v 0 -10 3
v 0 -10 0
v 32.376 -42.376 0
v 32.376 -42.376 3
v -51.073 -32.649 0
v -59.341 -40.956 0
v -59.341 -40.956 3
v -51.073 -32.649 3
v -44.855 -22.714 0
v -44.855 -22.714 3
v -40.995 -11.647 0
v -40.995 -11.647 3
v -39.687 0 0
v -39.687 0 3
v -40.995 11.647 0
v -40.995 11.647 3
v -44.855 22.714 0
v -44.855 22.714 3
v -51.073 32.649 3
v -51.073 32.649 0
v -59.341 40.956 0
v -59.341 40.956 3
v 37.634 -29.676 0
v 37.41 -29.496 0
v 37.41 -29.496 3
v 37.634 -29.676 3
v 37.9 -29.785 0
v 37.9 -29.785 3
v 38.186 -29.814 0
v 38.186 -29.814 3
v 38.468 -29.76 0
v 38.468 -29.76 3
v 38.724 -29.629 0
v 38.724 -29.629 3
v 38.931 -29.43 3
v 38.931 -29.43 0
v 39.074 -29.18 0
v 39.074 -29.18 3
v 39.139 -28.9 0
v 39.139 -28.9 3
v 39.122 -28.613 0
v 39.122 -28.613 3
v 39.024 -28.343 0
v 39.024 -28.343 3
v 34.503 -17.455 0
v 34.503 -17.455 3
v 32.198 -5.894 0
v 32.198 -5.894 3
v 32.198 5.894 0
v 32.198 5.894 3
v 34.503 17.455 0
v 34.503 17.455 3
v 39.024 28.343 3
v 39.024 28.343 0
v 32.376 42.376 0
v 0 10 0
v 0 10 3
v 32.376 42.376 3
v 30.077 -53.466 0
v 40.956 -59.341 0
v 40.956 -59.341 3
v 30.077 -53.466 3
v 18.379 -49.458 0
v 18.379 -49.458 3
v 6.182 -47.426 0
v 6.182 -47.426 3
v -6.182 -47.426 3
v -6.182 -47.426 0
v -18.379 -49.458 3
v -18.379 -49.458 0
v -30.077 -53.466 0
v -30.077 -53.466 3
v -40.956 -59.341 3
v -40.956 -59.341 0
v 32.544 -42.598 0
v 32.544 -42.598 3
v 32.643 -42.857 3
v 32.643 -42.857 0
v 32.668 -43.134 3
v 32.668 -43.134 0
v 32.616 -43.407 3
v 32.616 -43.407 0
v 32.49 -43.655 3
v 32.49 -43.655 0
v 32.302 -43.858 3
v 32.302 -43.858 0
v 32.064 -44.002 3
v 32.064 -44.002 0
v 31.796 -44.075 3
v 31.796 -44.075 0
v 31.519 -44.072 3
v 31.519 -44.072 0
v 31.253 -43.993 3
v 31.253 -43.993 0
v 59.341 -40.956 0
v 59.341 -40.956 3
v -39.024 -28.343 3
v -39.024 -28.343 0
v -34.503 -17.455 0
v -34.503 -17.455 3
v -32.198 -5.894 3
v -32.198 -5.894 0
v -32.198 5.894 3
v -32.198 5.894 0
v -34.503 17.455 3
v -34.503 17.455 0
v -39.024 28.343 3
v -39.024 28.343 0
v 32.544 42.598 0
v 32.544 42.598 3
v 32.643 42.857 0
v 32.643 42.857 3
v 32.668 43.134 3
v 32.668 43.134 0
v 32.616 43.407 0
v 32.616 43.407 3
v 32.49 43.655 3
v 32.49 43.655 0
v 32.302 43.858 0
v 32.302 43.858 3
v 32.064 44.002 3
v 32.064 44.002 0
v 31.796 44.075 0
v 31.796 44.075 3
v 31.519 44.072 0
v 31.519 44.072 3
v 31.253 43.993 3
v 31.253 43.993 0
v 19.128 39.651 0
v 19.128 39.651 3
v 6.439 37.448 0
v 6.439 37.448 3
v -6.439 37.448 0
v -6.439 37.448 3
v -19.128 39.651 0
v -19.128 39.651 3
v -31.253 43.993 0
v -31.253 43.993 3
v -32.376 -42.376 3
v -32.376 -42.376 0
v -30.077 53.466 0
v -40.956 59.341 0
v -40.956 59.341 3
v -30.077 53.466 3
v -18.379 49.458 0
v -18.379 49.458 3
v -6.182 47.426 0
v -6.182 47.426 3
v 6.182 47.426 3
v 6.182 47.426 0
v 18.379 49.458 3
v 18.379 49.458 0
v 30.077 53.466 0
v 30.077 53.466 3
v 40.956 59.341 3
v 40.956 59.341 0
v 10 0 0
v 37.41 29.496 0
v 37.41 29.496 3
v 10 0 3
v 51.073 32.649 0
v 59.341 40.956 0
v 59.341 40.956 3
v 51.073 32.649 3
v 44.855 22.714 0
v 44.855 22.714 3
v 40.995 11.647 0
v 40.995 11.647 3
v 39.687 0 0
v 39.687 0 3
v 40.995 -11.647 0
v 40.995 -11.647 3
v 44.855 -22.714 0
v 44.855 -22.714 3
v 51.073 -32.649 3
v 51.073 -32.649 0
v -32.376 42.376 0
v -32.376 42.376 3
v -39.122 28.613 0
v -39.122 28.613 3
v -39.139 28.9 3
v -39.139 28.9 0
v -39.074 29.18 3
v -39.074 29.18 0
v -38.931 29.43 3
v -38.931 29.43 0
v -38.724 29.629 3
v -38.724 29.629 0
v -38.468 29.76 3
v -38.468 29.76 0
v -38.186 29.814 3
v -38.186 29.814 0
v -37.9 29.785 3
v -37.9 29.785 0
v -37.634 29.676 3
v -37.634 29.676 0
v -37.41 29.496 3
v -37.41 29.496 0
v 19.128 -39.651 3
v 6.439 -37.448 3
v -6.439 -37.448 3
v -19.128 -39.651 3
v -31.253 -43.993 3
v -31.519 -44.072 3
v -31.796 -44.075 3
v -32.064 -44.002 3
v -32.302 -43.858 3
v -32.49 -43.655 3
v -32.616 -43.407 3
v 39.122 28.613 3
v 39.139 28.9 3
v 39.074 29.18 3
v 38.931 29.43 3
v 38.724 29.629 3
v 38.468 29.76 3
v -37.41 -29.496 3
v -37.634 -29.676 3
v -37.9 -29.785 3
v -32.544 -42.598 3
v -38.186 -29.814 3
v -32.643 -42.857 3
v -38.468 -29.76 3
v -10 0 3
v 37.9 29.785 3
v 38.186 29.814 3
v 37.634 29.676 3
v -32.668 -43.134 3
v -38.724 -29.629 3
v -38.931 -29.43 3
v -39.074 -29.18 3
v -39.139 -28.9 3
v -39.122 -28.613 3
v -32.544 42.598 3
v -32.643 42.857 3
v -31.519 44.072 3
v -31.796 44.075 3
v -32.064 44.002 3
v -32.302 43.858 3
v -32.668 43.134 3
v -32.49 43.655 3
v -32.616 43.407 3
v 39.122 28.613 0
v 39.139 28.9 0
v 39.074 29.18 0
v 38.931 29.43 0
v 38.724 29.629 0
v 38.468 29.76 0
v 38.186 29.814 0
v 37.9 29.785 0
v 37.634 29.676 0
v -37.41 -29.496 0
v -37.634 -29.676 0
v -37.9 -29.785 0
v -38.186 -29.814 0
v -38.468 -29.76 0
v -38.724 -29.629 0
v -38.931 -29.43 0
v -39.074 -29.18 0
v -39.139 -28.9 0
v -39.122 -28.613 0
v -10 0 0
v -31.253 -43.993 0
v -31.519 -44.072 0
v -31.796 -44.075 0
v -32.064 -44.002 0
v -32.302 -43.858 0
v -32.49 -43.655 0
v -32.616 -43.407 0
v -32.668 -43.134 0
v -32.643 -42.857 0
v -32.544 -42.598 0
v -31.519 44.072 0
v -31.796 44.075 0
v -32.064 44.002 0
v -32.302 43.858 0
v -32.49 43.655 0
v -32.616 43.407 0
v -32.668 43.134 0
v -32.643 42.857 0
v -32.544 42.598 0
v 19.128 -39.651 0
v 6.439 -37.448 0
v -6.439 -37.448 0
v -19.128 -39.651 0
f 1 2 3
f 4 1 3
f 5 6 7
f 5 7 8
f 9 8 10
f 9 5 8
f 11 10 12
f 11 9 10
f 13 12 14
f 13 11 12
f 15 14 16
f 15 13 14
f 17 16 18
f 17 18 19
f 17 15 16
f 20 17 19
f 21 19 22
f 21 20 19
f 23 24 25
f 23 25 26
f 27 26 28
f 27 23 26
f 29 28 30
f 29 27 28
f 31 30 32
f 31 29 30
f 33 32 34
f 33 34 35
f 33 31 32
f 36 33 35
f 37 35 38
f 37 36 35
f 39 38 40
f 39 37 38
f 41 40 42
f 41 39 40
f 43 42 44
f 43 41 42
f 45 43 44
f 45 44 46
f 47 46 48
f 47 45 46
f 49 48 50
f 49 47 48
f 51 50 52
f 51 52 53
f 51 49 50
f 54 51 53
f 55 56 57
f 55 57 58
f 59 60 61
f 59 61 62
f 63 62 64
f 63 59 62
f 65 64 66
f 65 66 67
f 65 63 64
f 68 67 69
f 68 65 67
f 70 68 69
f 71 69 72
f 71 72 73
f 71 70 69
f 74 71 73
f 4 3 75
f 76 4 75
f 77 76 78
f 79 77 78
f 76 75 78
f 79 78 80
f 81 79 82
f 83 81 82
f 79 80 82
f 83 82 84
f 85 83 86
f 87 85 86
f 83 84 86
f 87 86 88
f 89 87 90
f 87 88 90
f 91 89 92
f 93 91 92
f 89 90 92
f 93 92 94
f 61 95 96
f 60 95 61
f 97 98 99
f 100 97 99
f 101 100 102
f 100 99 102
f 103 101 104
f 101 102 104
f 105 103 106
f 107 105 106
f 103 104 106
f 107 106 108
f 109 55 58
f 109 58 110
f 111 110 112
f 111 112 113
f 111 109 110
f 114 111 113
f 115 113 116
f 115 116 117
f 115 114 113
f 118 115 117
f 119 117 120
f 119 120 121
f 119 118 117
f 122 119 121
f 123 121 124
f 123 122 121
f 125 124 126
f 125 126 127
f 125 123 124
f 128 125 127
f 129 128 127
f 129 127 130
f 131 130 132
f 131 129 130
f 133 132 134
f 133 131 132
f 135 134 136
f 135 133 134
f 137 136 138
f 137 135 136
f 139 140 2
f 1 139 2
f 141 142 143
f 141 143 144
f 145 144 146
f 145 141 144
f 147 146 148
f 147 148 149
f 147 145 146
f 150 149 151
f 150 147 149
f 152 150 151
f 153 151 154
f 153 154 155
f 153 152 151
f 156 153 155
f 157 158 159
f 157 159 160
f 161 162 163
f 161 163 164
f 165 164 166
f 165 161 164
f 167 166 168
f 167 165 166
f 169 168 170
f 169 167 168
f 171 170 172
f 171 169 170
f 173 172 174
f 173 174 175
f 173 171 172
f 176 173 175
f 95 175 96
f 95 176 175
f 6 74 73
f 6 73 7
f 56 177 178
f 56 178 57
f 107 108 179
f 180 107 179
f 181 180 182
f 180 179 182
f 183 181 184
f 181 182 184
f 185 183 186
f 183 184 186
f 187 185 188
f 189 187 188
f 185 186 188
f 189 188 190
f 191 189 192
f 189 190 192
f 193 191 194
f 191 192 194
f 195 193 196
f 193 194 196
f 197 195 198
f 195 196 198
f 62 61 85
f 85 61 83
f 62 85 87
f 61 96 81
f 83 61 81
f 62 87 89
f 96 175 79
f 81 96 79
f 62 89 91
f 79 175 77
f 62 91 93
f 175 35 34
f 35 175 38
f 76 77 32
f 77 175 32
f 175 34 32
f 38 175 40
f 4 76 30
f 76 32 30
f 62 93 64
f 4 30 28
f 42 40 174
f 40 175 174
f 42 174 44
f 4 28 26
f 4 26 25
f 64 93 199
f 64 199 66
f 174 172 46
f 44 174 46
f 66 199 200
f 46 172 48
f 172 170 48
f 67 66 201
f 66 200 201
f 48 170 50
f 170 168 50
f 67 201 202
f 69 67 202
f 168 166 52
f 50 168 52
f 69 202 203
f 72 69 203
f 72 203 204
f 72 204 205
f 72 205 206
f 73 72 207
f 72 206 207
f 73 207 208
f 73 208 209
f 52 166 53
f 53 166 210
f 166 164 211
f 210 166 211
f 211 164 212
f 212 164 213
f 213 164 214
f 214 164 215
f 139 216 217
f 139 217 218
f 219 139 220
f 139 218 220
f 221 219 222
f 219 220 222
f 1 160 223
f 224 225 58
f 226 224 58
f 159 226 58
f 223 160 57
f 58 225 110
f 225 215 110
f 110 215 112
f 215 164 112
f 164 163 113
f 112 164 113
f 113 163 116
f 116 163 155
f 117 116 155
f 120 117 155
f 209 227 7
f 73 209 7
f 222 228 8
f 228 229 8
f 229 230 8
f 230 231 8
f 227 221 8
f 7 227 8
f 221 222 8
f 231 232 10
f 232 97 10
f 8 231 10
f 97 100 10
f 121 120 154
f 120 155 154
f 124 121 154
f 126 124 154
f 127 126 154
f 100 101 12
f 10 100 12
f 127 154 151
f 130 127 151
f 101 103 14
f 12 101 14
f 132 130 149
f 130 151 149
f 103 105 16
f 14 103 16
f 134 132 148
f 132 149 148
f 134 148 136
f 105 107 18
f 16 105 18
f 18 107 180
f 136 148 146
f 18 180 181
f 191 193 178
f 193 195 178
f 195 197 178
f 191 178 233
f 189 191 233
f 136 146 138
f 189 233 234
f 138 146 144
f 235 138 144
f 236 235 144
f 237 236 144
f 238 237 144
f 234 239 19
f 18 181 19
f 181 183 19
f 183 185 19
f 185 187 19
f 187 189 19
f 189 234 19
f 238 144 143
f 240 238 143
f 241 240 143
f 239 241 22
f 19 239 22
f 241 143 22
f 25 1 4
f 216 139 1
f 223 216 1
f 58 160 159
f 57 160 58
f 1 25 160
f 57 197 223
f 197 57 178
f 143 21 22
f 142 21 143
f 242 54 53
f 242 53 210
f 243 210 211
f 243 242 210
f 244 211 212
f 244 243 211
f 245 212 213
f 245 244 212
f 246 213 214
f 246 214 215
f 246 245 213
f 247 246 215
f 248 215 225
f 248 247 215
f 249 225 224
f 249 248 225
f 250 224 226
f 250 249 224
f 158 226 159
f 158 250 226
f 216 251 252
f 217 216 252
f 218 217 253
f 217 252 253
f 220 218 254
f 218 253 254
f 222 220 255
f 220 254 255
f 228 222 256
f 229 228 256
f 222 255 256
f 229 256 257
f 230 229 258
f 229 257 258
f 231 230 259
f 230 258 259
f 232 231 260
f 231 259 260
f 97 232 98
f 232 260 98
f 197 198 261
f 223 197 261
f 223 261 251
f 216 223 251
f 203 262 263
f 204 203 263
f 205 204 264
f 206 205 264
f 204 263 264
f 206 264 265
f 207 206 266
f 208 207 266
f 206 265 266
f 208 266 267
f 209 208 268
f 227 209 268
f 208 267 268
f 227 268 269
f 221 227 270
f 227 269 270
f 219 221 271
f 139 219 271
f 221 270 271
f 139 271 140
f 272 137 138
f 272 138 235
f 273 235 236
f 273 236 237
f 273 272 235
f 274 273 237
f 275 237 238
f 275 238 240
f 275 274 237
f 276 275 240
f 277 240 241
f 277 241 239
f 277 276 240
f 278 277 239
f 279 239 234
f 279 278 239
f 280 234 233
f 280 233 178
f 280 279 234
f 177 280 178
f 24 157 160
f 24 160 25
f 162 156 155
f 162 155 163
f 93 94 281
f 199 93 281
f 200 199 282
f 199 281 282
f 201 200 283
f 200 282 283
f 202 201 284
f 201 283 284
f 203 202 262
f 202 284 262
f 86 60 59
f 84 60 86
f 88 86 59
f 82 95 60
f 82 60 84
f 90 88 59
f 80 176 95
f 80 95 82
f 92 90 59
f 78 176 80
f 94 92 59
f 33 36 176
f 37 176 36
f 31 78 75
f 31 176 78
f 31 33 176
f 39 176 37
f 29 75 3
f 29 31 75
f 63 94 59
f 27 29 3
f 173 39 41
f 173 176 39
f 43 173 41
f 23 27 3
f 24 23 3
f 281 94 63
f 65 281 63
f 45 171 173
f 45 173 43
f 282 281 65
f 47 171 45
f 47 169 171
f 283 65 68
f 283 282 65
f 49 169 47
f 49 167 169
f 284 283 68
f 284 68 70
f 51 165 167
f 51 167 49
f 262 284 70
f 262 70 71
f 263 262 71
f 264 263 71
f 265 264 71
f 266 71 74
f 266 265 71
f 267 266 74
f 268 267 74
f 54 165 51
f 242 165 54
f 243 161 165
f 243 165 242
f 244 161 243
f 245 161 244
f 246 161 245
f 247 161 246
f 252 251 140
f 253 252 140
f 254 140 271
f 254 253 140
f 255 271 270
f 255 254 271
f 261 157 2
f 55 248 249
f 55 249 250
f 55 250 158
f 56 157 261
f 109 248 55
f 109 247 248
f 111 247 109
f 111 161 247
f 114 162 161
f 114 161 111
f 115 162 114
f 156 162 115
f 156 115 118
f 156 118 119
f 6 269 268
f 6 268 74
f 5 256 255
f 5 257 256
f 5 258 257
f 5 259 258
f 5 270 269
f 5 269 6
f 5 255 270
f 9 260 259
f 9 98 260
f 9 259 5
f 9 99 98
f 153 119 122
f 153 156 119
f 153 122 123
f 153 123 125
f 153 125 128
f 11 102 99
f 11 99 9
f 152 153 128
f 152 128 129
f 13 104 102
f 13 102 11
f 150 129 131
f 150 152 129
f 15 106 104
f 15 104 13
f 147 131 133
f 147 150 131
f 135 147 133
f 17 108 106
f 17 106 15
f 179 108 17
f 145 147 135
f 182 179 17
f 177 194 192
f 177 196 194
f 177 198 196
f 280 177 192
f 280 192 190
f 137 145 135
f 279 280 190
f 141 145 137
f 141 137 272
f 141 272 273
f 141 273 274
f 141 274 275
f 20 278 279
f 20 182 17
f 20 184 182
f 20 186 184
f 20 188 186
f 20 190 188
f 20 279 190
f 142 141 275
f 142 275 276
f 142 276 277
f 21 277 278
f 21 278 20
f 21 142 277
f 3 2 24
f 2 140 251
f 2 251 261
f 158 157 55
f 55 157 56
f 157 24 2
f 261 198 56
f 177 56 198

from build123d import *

# Parameters (mm, degrees)
SKETCH1_R             = 5
BOSS_EXTRUDE1_DEPTH   = 0.1
BOSS_EXTRUDE1_2_DEPTH = 0.1
BOSS_EXTRUDE1_3_DEPTH = 0.1
BOSS_EXTRUDE1_4_DEPTH = 0.1
BOSS_EXTRUDE2_DEPTH   = 3


with BuildPart() as part:
    # Sketch1 → Boss-Extrude1 (new body)
    with BuildSketch(Plane.XY):
        with Locations((-44.491847198, 44.491847198)):
            Circle(SKETCH1_R)
    extrude(amount=BOSS_EXTRUDE1_DEPTH)



with BuildPart() as body_2:
    # Sketch1 → Boss-Extrude1 2 (new body)
    with BuildSketch(Plane.XY):
        with Locations((44.491847198, 44.491847198)):
            Circle(SKETCH1_R)
    extrude(amount=BOSS_EXTRUDE1_2_DEPTH)


with BuildPart() as body_3:
    # Sketch1 → Boss-Extrude1 3 (new body)
    with BuildSketch(Plane.XY):
        with Locations((44.491847198, -44.491847198)):
            Circle(SKETCH1_R)
    extrude(amount=BOSS_EXTRUDE1_3_DEPTH)


with BuildPart() as body_4:
    # Sketch1 → Boss-Extrude1 4 (new body)
    with BuildSketch(Plane.XY):
        with Locations((-44.491847198, -44.491847198)):
            Circle(SKETCH1_R)
    extrude(amount=BOSS_EXTRUDE1_4_DEPTH)


with BuildPart() as part_1:
    add(part.part)

    add(body_2.part)  # Boss-Extrude2 merges body 2

    add(body_3.part)  # Boss-Extrude2 merges body 3

    add(body_4.part)  # Boss-Extrude2 merges body 4
    # Sketch2 → Boss-Extrude2 (add)
    with BuildSketch(Plane.XY):
        with BuildLine():
            Line((-59.341089603, 40.956313292), (-40.956313292, 59.341089603))
            ThreePointArc((-40.956313292, 59.341089603), (0, 47.170862812), (40.956313292, 59.341089603))
            Line((40.956313292, 59.341089603), (59.341089603, 40.956313292))
            ThreePointArc((59.341089603, 40.956313292), (39.686643359, 0), (59.341089603, -40.956313292))
            Line((59.341089603, -40.956313292), (40.956313292, -59.341089603))
            ThreePointArc((40.956313292, -59.341089603), (0, -47.170862812), (-40.956313292, -59.341089603))
            Line((-40.956313292, -59.341089603), (-59.341089603, -40.956313292))
            ThreePointArc((-59.341089603, -40.956313292), (-39.686643359, 0), (-59.341089603, 40.956313292))
        make_face()
        with BuildLine():
            Line((-32.376492153, 42.376492153), (0, 10))
            Line((0, 10), (32.376492153, 42.376492153))
            ThreePointArc((32.376492153, 42.376492153), (32.490402214, 43.654502905), (31.252682932, 43.99264188))
            ThreePointArc((31.252682932, 43.99264188), (0, 37.170862812), (-31.252682932, 43.99264188))
            ThreePointArc((-31.252682932, 43.99264188), (-32.490402214, 43.654502905), (-32.376492153, 42.376492153))
        make_face(mode=Mode.SUBTRACT)
        with BuildLine():
            Line((-37.410135101, 29.495739933), (-10, 0))
            Line((-10, 0), (-37.410135101, -29.495739933))
            ThreePointArc((-37.410135101, -29.495739933), (-38.724006049, -29.628666123), (-39.024062115, -28.342628566))
            ThreePointArc((-39.024062115, -28.342628566), (-31.907853639, 0), (-39.024062115, 28.342628566))
            ThreePointArc((-39.024062115, 28.342628566), (-38.724006049, 29.628666123), (-37.410135101, 29.495739933))
        make_face(mode=Mode.SUBTRACT)
        with BuildLine():
            Line((10, 0), (37.410135101, -29.495739933))
            ThreePointArc((37.410135101, -29.495739933), (38.724006049, -29.628666123), (39.024062115, -28.342628566))
            ThreePointArc((39.024062115, -28.342628566), (31.907853639, 0), (39.024062115, 28.342628566))
            ThreePointArc((39.024062115, 28.342628566), (38.724006049, 29.628666123), (37.410135101, 29.495739933))
            Line((37.410135101, 29.495739933), (10, 0))
        make_face(mode=Mode.SUBTRACT)
        with BuildLine():
            Line((0, -10), (32.376492153, -42.376492153))
            ThreePointArc((32.376492153, -42.376492153), (32.490402214, -43.654502905), (31.252682932, -43.99264188))
            ThreePointArc((31.252682932, -43.99264188), (0, -37.170862812), (-31.252682932, -43.99264188))
            ThreePointArc((-31.252682932, -43.99264188), (-32.490402214, -43.654502905), (-32.376492153, -42.376492153))
            Line((-32.376492153, -42.376492153), (0, -10))
        make_face(mode=Mode.SUBTRACT)
    extrude(amount=BOSS_EXTRUDE2_DEPTH)


solid = part_1.part
